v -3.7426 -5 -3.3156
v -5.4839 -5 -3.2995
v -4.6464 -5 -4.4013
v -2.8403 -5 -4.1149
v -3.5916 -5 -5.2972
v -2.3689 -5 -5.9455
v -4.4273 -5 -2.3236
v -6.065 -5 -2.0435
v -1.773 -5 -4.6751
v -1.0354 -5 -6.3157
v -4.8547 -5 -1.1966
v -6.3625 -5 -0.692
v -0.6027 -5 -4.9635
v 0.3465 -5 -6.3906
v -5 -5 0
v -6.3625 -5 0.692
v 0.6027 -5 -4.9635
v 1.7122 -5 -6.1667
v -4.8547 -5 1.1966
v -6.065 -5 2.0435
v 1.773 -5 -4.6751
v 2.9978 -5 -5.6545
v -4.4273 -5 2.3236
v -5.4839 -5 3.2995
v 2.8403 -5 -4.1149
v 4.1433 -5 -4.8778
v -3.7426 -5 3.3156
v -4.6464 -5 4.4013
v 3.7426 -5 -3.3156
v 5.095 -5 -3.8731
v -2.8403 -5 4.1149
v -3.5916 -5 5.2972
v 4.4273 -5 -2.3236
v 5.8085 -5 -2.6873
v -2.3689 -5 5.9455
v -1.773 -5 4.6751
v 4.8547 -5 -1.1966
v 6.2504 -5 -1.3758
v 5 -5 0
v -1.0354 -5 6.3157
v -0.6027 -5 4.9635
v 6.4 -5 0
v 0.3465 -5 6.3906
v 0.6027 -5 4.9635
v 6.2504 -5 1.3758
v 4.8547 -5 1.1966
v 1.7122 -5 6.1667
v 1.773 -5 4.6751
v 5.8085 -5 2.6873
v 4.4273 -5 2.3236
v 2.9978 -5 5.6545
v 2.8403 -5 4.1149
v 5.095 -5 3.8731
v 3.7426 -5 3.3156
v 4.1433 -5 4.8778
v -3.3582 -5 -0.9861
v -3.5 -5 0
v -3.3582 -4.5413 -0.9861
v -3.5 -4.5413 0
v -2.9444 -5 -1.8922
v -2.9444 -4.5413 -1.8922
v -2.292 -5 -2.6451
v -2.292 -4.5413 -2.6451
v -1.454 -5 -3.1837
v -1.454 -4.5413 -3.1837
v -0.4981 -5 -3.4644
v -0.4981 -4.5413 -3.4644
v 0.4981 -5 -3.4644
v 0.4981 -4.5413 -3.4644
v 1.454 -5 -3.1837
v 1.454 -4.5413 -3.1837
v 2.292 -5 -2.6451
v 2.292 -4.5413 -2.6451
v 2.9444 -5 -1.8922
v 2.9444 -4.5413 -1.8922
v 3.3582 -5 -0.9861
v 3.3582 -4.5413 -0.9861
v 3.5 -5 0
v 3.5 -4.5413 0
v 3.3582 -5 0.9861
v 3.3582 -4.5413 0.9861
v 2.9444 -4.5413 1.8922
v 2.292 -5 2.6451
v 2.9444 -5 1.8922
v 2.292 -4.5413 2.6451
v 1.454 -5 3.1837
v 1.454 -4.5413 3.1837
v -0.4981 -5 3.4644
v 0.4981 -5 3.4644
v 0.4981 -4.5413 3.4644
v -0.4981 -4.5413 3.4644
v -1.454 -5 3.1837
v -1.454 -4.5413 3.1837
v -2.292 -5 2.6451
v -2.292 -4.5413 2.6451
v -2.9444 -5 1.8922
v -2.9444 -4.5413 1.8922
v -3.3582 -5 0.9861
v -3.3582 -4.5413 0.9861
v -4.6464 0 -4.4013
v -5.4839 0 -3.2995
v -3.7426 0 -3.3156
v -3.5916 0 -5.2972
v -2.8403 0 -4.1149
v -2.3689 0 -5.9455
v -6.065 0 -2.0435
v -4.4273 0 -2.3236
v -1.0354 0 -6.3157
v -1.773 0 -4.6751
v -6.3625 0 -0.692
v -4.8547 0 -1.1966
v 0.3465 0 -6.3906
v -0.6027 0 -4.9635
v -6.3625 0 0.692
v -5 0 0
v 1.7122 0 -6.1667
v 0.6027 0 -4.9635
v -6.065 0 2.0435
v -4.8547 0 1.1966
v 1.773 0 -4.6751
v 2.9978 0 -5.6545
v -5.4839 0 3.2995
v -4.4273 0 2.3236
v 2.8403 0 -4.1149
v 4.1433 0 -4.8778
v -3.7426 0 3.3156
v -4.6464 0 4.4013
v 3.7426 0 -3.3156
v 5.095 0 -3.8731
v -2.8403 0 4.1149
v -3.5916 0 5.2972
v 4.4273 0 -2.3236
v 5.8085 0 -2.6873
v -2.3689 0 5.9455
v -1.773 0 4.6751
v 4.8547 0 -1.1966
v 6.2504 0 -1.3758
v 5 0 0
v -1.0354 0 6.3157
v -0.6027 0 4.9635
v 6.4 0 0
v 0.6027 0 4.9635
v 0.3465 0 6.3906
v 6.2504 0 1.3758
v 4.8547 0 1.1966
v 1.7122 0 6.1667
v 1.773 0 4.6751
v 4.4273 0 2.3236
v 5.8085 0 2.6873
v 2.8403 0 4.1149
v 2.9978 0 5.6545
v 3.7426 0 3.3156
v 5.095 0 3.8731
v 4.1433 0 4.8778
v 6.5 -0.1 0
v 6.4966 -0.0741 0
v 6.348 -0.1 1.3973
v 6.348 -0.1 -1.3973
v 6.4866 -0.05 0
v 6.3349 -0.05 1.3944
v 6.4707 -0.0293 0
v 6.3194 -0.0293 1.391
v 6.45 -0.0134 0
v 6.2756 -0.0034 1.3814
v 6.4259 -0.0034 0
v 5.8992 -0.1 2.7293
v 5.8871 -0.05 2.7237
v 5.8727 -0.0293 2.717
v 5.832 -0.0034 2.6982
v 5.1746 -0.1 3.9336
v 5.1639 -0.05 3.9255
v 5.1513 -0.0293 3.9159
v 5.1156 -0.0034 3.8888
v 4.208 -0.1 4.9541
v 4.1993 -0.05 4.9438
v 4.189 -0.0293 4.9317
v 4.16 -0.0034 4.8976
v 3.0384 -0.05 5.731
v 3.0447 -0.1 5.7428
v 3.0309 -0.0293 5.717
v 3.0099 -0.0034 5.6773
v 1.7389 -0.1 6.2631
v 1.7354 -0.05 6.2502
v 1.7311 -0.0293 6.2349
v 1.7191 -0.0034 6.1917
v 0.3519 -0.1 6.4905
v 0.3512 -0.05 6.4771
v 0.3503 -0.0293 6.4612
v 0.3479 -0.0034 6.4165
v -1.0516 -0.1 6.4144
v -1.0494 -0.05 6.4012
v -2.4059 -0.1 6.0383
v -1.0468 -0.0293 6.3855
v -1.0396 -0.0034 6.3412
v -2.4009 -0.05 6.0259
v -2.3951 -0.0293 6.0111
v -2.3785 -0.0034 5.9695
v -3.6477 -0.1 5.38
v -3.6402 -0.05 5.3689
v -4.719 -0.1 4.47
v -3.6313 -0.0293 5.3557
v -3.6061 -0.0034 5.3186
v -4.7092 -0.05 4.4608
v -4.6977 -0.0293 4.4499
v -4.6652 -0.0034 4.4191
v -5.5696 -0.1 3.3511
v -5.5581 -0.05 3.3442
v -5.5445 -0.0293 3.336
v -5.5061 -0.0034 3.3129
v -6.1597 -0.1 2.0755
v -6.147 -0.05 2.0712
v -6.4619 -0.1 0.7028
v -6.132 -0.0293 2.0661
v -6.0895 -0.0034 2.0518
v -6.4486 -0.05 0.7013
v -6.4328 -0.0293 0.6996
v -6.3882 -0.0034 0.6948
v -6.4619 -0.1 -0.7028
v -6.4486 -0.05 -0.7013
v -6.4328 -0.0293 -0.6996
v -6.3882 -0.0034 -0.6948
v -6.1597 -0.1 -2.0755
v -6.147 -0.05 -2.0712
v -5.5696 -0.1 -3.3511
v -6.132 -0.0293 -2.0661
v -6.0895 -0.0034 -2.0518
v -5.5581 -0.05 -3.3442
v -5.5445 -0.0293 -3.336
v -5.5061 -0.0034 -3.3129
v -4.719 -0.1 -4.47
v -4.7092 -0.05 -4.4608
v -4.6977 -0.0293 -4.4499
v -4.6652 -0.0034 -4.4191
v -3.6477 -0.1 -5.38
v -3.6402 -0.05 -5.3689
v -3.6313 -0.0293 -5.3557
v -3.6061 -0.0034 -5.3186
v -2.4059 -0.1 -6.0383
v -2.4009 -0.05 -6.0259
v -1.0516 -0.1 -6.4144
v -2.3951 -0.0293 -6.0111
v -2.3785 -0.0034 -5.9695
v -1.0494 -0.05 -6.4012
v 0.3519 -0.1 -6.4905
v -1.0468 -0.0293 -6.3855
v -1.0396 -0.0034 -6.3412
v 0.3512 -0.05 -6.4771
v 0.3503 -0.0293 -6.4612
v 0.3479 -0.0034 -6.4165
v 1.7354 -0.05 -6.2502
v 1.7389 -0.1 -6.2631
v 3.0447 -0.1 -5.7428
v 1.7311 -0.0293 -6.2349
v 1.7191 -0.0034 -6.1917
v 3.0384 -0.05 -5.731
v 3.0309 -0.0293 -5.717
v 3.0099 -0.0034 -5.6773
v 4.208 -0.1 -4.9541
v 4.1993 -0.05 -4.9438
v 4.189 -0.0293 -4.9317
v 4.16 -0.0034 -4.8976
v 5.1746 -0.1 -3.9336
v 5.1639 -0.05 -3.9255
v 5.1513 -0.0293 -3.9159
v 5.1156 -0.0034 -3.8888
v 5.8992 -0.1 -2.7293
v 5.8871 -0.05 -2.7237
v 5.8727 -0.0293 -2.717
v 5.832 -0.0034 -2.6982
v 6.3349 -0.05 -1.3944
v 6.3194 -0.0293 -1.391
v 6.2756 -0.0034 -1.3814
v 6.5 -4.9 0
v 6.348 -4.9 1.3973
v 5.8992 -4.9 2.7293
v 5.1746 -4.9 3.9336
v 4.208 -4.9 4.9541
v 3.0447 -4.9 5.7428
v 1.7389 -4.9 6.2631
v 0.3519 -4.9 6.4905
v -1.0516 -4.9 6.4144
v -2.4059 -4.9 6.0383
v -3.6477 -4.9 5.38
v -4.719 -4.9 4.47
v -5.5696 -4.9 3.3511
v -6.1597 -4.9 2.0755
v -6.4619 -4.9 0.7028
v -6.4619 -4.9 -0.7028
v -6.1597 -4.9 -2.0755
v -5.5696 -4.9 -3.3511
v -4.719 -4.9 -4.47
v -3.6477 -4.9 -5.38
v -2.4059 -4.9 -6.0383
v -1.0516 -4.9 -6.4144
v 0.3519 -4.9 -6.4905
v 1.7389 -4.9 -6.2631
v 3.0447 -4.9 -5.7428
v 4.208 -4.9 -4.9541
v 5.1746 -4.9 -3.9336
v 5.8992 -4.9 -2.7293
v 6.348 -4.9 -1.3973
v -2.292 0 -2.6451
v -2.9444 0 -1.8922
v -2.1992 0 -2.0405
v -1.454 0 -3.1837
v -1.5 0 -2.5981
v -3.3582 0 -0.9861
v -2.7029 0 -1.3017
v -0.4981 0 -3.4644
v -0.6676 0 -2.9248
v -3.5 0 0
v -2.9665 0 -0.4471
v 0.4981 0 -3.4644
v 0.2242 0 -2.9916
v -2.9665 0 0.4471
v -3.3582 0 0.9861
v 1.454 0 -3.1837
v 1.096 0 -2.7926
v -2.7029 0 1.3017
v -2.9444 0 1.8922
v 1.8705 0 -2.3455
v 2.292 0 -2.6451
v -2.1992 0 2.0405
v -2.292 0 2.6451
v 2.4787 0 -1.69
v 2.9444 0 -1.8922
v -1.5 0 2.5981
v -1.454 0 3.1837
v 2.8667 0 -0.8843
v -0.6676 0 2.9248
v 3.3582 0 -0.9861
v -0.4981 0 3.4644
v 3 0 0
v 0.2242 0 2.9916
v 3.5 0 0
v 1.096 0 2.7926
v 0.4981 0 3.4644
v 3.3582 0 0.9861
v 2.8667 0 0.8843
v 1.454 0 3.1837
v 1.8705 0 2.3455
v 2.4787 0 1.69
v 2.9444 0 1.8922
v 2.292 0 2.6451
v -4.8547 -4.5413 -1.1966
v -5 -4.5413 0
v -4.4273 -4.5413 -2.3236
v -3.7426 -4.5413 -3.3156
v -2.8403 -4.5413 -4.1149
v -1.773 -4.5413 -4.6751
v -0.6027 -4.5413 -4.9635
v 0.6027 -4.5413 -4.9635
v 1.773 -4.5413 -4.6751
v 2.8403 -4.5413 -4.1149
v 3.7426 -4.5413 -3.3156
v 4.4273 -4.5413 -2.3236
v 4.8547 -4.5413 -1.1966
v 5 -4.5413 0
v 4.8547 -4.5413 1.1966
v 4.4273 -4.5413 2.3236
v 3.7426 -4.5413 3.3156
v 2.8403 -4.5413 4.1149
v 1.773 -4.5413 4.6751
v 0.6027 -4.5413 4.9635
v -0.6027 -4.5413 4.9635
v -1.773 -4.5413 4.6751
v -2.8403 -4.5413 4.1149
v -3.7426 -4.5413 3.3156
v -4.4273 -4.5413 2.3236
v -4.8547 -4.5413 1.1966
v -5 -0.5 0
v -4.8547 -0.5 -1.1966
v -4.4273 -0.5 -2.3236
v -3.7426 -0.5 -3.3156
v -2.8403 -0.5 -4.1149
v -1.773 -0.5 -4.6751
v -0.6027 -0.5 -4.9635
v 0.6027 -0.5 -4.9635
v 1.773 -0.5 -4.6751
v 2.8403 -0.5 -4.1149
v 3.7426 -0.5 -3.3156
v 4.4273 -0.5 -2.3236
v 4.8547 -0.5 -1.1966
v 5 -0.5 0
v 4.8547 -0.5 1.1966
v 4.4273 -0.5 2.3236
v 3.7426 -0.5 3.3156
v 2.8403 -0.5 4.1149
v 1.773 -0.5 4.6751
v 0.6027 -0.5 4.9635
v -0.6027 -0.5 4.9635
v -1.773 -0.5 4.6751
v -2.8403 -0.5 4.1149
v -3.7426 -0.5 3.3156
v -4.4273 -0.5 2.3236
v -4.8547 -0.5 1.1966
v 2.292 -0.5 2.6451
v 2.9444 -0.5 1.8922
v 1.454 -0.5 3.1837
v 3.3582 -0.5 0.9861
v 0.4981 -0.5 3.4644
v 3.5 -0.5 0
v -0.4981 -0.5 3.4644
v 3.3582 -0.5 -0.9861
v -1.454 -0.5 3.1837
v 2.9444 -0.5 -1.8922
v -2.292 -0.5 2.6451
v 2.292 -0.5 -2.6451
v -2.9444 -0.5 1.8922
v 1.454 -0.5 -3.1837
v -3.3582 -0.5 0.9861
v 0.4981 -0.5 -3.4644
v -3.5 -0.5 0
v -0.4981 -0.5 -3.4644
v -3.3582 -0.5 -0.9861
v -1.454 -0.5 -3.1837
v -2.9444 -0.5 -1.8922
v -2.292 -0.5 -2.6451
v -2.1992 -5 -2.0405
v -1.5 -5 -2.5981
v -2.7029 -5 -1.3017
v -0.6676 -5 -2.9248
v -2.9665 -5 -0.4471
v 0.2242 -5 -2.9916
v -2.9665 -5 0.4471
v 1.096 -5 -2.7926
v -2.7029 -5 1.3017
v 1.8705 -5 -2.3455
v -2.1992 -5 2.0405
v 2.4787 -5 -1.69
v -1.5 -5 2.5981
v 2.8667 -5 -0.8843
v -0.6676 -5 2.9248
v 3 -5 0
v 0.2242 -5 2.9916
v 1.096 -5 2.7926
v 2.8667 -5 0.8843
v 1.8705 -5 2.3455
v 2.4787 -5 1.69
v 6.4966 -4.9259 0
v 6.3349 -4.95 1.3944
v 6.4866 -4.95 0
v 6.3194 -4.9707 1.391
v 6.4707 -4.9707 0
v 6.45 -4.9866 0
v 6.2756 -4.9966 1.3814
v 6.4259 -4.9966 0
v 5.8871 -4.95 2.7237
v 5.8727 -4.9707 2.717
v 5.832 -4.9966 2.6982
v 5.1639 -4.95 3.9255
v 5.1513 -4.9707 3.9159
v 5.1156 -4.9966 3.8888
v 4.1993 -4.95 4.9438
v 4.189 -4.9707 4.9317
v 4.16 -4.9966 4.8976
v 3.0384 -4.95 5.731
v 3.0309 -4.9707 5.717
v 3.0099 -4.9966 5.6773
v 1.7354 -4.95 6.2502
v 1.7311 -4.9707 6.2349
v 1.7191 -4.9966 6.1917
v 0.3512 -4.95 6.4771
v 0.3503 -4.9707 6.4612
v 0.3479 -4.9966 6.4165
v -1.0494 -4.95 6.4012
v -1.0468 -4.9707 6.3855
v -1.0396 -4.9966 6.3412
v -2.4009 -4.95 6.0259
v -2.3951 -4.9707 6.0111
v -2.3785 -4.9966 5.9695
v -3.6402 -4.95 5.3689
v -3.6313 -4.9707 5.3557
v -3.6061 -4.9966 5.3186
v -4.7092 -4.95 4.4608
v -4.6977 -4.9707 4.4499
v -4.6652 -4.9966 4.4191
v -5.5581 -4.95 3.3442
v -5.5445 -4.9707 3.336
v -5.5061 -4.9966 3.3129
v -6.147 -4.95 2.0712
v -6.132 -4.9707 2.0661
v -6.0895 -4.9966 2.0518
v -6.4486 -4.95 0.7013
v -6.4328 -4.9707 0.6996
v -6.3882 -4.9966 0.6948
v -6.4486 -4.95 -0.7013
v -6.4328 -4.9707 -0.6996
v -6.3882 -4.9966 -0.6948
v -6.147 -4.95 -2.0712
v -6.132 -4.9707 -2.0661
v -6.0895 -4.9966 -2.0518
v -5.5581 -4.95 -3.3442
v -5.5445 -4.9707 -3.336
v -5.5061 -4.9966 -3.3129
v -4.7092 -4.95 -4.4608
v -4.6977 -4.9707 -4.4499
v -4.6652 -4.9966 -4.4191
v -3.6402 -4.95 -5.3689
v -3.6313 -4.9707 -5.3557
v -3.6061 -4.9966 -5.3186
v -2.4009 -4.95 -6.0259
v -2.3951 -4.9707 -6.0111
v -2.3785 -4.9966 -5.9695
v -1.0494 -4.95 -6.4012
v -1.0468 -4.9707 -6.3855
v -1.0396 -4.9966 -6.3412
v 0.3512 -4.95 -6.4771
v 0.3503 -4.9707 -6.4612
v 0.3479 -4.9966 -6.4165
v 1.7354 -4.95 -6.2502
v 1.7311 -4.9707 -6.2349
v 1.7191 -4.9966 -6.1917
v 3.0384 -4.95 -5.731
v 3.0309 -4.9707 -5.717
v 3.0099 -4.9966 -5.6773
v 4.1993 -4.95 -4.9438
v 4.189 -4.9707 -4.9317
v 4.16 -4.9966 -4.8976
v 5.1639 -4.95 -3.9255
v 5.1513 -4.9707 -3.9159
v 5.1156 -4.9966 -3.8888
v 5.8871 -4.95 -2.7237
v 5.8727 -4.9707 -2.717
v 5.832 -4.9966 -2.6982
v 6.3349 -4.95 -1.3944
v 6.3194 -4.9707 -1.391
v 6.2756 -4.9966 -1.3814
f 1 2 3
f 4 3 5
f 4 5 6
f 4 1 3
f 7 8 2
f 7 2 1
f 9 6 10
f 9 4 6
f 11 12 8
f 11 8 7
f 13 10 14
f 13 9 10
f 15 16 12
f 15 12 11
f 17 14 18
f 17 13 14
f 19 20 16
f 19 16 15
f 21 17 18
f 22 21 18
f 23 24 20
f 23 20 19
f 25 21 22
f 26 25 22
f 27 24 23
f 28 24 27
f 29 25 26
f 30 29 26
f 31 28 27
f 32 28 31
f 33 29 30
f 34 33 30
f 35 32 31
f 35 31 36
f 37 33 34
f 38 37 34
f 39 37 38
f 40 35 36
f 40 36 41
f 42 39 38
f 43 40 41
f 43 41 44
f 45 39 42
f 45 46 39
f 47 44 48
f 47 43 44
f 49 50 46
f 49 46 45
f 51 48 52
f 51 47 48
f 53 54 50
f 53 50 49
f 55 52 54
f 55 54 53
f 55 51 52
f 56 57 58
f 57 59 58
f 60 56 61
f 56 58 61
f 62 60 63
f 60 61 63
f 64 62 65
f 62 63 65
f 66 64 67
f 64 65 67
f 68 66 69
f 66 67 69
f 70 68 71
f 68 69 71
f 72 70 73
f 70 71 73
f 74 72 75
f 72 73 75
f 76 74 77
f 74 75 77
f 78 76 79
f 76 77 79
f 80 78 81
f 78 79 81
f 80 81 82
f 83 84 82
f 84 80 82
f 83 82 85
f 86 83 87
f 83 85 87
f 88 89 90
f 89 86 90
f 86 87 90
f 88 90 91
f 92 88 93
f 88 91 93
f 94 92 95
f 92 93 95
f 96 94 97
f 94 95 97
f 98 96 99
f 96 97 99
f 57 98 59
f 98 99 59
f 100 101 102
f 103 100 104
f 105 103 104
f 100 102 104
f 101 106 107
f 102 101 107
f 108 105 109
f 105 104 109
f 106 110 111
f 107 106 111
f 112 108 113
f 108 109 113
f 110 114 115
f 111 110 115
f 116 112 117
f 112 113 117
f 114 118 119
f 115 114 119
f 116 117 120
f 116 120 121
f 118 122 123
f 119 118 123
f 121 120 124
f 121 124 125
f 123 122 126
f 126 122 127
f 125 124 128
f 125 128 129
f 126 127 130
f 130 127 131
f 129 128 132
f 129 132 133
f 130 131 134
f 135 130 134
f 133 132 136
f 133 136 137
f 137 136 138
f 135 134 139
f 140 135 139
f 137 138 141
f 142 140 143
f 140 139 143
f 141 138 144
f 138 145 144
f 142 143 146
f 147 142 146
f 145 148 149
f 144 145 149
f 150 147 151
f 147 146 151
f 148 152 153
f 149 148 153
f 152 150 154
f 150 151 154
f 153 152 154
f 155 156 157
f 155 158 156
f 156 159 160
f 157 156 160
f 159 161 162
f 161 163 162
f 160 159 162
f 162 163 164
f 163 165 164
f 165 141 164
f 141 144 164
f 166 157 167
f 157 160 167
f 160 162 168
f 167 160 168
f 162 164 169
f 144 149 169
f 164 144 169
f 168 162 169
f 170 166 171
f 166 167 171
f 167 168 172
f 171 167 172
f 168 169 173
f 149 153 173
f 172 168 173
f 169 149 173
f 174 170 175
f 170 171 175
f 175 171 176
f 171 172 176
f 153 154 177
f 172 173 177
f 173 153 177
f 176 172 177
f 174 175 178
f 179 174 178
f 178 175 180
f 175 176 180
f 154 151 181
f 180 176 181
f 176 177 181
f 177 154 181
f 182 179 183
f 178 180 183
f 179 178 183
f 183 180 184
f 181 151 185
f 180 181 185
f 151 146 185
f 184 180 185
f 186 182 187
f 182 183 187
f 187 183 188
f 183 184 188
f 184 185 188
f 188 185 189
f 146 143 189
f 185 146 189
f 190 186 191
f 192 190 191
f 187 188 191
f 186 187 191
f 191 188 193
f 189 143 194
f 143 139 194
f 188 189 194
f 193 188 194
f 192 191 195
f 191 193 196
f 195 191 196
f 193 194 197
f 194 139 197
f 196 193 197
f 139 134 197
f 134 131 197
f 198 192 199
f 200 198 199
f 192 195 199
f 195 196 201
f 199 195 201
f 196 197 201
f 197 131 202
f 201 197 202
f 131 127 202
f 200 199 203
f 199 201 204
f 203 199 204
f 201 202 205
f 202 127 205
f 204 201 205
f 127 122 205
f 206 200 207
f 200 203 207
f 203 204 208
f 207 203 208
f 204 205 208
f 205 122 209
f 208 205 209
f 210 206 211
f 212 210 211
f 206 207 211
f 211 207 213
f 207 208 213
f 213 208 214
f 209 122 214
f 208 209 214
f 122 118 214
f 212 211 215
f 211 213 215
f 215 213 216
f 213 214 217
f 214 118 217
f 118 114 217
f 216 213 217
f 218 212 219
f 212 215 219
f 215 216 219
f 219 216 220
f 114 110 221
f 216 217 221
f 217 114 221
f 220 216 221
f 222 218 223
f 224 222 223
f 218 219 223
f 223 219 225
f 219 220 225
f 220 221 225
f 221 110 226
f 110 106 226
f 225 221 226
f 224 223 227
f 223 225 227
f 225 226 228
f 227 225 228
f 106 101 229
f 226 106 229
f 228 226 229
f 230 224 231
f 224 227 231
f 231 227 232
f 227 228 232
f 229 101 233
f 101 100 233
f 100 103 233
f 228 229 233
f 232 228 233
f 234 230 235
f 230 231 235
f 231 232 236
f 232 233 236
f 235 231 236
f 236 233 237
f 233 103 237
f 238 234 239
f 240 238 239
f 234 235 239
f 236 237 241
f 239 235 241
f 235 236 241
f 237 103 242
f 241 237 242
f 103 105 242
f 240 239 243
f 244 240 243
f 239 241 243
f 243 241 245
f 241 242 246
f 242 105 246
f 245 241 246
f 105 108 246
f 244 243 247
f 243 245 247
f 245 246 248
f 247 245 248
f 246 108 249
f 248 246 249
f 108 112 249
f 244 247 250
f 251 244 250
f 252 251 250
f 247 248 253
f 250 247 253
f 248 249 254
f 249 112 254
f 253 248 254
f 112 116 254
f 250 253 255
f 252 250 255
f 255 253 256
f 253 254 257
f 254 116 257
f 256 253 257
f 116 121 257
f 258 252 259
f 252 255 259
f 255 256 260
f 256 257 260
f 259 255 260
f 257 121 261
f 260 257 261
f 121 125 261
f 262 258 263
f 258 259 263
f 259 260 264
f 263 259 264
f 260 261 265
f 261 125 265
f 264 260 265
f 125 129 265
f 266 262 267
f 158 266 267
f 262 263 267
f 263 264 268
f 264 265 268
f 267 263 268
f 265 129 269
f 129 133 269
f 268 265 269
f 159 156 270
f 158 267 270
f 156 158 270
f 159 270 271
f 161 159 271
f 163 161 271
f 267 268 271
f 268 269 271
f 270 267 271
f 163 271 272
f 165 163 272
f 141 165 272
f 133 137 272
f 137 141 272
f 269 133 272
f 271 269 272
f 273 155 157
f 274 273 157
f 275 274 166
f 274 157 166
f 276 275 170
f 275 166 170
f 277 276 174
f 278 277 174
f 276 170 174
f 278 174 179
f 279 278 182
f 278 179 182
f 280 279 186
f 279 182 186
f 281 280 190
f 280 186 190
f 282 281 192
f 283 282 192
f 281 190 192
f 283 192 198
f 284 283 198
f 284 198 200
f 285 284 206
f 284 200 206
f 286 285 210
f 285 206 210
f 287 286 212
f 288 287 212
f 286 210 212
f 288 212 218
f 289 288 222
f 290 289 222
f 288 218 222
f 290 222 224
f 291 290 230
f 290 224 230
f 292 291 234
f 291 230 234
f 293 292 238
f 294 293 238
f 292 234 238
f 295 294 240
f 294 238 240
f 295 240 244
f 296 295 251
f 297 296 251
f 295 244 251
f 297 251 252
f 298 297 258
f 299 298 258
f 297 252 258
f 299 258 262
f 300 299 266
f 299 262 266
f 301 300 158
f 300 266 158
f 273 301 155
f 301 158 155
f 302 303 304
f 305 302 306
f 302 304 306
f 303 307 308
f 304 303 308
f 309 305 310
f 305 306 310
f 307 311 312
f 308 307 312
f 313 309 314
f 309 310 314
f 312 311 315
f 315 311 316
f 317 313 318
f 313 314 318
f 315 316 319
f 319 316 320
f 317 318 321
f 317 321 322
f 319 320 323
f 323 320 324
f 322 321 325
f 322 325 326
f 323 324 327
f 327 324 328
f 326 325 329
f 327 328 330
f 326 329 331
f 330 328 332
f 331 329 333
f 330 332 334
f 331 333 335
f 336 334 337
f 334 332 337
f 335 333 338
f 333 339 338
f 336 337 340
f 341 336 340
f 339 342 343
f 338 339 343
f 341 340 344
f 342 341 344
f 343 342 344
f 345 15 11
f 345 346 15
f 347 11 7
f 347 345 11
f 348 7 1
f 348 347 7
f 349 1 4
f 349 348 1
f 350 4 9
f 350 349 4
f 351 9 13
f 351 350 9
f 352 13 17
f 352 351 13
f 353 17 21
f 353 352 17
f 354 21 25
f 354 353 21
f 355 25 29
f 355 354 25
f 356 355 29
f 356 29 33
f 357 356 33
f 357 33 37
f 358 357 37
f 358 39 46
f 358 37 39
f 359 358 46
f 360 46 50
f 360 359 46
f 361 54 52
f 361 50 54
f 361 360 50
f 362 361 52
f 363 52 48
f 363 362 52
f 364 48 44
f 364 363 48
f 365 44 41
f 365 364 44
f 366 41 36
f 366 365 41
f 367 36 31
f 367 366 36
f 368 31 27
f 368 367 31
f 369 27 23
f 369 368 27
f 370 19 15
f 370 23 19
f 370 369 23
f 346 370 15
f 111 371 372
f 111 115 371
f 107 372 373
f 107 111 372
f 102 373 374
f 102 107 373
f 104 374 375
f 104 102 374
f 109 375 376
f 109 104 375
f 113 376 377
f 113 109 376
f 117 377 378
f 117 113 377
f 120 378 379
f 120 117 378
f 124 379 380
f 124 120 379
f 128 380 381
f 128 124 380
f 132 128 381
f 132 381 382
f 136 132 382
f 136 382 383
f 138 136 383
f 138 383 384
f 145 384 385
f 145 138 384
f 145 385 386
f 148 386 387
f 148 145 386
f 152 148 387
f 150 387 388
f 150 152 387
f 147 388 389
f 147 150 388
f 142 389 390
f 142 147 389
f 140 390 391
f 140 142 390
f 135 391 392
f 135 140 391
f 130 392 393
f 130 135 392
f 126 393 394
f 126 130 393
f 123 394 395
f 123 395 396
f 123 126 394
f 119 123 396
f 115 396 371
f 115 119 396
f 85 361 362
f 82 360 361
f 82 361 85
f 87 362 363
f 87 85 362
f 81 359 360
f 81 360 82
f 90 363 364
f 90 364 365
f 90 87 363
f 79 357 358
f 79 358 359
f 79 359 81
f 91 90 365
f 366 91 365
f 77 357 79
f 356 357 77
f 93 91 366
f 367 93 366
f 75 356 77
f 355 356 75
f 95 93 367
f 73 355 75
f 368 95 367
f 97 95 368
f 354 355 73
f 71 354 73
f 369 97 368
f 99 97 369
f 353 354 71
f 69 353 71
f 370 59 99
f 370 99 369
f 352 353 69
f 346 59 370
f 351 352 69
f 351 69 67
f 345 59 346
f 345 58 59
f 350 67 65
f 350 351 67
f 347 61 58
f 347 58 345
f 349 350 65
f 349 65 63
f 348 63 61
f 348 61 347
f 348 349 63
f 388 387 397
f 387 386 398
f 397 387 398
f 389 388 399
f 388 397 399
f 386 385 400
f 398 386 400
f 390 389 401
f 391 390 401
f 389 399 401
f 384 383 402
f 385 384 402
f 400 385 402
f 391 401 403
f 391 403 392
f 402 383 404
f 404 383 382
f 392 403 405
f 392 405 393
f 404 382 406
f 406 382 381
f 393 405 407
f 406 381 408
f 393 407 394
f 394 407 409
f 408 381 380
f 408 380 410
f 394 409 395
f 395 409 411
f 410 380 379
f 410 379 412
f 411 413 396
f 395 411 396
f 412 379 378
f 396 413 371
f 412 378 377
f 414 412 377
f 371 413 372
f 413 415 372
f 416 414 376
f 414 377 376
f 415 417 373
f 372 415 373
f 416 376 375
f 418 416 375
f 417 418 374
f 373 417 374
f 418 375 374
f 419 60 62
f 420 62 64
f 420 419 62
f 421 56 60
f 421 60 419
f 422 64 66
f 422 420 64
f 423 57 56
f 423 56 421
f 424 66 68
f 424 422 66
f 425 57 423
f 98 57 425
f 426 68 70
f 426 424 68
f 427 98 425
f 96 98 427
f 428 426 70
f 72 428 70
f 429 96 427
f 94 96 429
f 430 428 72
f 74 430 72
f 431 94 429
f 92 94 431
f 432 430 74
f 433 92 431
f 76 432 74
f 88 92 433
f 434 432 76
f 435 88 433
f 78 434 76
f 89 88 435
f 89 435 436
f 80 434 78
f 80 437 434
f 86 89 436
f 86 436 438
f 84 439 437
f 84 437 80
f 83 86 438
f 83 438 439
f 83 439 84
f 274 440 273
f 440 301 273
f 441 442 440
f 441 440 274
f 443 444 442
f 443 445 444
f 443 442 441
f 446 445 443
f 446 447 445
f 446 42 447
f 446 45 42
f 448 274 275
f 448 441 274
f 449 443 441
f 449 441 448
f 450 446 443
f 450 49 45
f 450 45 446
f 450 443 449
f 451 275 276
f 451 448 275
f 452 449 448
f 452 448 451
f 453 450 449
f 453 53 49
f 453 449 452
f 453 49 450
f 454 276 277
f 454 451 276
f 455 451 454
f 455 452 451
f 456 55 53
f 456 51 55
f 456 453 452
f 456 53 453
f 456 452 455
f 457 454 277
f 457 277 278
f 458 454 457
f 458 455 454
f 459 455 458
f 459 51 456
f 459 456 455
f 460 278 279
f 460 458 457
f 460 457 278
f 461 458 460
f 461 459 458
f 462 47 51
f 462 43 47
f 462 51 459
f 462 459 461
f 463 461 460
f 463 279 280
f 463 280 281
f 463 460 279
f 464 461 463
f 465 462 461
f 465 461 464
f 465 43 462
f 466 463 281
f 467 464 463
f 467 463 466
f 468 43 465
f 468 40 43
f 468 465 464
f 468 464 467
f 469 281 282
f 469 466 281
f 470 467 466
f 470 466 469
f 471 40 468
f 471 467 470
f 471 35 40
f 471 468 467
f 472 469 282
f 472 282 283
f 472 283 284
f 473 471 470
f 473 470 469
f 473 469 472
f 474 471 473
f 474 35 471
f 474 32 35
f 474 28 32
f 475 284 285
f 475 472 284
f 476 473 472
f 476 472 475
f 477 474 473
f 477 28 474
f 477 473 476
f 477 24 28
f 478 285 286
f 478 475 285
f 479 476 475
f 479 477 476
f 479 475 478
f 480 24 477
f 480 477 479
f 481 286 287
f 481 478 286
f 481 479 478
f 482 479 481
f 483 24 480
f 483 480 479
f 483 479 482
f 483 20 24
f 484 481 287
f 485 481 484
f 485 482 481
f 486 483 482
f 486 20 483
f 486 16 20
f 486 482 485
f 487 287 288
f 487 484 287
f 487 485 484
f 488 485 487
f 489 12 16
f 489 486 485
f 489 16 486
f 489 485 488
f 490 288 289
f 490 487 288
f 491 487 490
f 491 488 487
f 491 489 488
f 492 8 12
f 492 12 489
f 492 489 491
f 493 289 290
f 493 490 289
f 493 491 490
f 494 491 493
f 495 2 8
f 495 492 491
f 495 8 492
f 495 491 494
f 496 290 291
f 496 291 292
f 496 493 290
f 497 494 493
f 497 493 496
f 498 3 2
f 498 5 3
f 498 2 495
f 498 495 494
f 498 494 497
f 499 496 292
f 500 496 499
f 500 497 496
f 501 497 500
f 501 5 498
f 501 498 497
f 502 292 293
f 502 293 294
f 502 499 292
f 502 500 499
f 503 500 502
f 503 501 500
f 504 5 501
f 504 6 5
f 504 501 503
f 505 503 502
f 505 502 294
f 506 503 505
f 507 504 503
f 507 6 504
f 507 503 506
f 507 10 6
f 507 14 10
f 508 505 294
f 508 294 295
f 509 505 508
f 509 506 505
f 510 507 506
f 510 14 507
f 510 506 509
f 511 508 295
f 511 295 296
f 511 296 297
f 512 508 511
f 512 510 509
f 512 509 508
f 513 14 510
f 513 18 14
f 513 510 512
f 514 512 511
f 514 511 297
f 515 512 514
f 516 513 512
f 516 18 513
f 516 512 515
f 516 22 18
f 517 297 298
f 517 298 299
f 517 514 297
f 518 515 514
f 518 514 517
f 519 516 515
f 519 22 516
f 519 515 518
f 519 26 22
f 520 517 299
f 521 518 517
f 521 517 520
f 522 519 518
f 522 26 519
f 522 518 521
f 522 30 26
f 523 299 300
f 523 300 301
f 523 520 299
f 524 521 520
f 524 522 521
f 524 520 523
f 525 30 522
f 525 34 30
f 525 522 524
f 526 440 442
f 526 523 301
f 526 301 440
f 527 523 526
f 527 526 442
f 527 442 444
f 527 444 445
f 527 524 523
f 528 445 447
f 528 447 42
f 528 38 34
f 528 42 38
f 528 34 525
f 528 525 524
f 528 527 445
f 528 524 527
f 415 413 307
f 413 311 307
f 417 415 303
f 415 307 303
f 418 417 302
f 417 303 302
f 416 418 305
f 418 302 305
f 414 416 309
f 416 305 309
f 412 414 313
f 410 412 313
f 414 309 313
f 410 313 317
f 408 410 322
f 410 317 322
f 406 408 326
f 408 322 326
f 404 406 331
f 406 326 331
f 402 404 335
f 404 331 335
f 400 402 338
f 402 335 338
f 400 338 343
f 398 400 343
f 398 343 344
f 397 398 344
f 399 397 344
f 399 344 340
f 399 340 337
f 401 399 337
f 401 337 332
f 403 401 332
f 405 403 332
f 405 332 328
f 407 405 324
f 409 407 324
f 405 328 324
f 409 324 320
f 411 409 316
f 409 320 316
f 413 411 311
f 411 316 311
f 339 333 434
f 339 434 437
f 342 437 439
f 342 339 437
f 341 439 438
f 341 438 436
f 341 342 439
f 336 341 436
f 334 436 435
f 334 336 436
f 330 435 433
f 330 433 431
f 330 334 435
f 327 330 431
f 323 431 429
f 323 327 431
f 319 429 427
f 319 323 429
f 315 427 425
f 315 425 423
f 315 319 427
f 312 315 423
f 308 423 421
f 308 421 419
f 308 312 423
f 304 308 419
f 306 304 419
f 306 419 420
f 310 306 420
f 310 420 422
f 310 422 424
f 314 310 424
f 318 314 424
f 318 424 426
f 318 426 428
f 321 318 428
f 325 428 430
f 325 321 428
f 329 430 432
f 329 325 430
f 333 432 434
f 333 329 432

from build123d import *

# Parameters (mm, degrees)
F0_R     = 6.5
F0_R_2   = 3
F1_DEPTH = 5
F2_W     = 1.5
F2_H     = 0.5
F5_R     = 0.1
F6_R     = 0.1


with BuildPart() as f1:
    # F0 (on Front) → F1 (new body)
    with BuildSketch(Plane.XZ):
        Circle(F0_R)
        Circle(F0_R_2, mode=Mode.SUBTRACT)
    extrude(amount=F1_DEPTH)

    # F2 (on Top) → F3 (revolve, cut)
    with BuildSketch(Plane.XY):
        with Locations((-4.25, -4.791322)):
            Rectangle(F2_W, F2_H)
    revolve(axis=Axis((0, -1.116181, 0), (0, -1, 0)), mode=Mode.SUBTRACT)

    # F2 (on Top) → F4 (revolve, cut)
    with BuildSketch(Plane.XY):
        with Locations((-4.25, -0.25)):
            Rectangle(F2_W, F2_H)
    revolve(axis=Axis((0, -1.116181, 0), (0, -1, 0)), mode=Mode.SUBTRACT)

    # F5
    f5_edges = [f1.edges().sort_by_distance(p)[0] for p in [
        (-6.5, -5, 0),
    ]]
    fillet(f5_edges, radius=F5_R)

    # F6
    f6_edges = [f1.edges().sort_by_distance(p)[0] for p in [
        (-6.5, 0, 0),
    ]]
    fillet(f6_edges, radius=F6_R)


solid = f1.part
